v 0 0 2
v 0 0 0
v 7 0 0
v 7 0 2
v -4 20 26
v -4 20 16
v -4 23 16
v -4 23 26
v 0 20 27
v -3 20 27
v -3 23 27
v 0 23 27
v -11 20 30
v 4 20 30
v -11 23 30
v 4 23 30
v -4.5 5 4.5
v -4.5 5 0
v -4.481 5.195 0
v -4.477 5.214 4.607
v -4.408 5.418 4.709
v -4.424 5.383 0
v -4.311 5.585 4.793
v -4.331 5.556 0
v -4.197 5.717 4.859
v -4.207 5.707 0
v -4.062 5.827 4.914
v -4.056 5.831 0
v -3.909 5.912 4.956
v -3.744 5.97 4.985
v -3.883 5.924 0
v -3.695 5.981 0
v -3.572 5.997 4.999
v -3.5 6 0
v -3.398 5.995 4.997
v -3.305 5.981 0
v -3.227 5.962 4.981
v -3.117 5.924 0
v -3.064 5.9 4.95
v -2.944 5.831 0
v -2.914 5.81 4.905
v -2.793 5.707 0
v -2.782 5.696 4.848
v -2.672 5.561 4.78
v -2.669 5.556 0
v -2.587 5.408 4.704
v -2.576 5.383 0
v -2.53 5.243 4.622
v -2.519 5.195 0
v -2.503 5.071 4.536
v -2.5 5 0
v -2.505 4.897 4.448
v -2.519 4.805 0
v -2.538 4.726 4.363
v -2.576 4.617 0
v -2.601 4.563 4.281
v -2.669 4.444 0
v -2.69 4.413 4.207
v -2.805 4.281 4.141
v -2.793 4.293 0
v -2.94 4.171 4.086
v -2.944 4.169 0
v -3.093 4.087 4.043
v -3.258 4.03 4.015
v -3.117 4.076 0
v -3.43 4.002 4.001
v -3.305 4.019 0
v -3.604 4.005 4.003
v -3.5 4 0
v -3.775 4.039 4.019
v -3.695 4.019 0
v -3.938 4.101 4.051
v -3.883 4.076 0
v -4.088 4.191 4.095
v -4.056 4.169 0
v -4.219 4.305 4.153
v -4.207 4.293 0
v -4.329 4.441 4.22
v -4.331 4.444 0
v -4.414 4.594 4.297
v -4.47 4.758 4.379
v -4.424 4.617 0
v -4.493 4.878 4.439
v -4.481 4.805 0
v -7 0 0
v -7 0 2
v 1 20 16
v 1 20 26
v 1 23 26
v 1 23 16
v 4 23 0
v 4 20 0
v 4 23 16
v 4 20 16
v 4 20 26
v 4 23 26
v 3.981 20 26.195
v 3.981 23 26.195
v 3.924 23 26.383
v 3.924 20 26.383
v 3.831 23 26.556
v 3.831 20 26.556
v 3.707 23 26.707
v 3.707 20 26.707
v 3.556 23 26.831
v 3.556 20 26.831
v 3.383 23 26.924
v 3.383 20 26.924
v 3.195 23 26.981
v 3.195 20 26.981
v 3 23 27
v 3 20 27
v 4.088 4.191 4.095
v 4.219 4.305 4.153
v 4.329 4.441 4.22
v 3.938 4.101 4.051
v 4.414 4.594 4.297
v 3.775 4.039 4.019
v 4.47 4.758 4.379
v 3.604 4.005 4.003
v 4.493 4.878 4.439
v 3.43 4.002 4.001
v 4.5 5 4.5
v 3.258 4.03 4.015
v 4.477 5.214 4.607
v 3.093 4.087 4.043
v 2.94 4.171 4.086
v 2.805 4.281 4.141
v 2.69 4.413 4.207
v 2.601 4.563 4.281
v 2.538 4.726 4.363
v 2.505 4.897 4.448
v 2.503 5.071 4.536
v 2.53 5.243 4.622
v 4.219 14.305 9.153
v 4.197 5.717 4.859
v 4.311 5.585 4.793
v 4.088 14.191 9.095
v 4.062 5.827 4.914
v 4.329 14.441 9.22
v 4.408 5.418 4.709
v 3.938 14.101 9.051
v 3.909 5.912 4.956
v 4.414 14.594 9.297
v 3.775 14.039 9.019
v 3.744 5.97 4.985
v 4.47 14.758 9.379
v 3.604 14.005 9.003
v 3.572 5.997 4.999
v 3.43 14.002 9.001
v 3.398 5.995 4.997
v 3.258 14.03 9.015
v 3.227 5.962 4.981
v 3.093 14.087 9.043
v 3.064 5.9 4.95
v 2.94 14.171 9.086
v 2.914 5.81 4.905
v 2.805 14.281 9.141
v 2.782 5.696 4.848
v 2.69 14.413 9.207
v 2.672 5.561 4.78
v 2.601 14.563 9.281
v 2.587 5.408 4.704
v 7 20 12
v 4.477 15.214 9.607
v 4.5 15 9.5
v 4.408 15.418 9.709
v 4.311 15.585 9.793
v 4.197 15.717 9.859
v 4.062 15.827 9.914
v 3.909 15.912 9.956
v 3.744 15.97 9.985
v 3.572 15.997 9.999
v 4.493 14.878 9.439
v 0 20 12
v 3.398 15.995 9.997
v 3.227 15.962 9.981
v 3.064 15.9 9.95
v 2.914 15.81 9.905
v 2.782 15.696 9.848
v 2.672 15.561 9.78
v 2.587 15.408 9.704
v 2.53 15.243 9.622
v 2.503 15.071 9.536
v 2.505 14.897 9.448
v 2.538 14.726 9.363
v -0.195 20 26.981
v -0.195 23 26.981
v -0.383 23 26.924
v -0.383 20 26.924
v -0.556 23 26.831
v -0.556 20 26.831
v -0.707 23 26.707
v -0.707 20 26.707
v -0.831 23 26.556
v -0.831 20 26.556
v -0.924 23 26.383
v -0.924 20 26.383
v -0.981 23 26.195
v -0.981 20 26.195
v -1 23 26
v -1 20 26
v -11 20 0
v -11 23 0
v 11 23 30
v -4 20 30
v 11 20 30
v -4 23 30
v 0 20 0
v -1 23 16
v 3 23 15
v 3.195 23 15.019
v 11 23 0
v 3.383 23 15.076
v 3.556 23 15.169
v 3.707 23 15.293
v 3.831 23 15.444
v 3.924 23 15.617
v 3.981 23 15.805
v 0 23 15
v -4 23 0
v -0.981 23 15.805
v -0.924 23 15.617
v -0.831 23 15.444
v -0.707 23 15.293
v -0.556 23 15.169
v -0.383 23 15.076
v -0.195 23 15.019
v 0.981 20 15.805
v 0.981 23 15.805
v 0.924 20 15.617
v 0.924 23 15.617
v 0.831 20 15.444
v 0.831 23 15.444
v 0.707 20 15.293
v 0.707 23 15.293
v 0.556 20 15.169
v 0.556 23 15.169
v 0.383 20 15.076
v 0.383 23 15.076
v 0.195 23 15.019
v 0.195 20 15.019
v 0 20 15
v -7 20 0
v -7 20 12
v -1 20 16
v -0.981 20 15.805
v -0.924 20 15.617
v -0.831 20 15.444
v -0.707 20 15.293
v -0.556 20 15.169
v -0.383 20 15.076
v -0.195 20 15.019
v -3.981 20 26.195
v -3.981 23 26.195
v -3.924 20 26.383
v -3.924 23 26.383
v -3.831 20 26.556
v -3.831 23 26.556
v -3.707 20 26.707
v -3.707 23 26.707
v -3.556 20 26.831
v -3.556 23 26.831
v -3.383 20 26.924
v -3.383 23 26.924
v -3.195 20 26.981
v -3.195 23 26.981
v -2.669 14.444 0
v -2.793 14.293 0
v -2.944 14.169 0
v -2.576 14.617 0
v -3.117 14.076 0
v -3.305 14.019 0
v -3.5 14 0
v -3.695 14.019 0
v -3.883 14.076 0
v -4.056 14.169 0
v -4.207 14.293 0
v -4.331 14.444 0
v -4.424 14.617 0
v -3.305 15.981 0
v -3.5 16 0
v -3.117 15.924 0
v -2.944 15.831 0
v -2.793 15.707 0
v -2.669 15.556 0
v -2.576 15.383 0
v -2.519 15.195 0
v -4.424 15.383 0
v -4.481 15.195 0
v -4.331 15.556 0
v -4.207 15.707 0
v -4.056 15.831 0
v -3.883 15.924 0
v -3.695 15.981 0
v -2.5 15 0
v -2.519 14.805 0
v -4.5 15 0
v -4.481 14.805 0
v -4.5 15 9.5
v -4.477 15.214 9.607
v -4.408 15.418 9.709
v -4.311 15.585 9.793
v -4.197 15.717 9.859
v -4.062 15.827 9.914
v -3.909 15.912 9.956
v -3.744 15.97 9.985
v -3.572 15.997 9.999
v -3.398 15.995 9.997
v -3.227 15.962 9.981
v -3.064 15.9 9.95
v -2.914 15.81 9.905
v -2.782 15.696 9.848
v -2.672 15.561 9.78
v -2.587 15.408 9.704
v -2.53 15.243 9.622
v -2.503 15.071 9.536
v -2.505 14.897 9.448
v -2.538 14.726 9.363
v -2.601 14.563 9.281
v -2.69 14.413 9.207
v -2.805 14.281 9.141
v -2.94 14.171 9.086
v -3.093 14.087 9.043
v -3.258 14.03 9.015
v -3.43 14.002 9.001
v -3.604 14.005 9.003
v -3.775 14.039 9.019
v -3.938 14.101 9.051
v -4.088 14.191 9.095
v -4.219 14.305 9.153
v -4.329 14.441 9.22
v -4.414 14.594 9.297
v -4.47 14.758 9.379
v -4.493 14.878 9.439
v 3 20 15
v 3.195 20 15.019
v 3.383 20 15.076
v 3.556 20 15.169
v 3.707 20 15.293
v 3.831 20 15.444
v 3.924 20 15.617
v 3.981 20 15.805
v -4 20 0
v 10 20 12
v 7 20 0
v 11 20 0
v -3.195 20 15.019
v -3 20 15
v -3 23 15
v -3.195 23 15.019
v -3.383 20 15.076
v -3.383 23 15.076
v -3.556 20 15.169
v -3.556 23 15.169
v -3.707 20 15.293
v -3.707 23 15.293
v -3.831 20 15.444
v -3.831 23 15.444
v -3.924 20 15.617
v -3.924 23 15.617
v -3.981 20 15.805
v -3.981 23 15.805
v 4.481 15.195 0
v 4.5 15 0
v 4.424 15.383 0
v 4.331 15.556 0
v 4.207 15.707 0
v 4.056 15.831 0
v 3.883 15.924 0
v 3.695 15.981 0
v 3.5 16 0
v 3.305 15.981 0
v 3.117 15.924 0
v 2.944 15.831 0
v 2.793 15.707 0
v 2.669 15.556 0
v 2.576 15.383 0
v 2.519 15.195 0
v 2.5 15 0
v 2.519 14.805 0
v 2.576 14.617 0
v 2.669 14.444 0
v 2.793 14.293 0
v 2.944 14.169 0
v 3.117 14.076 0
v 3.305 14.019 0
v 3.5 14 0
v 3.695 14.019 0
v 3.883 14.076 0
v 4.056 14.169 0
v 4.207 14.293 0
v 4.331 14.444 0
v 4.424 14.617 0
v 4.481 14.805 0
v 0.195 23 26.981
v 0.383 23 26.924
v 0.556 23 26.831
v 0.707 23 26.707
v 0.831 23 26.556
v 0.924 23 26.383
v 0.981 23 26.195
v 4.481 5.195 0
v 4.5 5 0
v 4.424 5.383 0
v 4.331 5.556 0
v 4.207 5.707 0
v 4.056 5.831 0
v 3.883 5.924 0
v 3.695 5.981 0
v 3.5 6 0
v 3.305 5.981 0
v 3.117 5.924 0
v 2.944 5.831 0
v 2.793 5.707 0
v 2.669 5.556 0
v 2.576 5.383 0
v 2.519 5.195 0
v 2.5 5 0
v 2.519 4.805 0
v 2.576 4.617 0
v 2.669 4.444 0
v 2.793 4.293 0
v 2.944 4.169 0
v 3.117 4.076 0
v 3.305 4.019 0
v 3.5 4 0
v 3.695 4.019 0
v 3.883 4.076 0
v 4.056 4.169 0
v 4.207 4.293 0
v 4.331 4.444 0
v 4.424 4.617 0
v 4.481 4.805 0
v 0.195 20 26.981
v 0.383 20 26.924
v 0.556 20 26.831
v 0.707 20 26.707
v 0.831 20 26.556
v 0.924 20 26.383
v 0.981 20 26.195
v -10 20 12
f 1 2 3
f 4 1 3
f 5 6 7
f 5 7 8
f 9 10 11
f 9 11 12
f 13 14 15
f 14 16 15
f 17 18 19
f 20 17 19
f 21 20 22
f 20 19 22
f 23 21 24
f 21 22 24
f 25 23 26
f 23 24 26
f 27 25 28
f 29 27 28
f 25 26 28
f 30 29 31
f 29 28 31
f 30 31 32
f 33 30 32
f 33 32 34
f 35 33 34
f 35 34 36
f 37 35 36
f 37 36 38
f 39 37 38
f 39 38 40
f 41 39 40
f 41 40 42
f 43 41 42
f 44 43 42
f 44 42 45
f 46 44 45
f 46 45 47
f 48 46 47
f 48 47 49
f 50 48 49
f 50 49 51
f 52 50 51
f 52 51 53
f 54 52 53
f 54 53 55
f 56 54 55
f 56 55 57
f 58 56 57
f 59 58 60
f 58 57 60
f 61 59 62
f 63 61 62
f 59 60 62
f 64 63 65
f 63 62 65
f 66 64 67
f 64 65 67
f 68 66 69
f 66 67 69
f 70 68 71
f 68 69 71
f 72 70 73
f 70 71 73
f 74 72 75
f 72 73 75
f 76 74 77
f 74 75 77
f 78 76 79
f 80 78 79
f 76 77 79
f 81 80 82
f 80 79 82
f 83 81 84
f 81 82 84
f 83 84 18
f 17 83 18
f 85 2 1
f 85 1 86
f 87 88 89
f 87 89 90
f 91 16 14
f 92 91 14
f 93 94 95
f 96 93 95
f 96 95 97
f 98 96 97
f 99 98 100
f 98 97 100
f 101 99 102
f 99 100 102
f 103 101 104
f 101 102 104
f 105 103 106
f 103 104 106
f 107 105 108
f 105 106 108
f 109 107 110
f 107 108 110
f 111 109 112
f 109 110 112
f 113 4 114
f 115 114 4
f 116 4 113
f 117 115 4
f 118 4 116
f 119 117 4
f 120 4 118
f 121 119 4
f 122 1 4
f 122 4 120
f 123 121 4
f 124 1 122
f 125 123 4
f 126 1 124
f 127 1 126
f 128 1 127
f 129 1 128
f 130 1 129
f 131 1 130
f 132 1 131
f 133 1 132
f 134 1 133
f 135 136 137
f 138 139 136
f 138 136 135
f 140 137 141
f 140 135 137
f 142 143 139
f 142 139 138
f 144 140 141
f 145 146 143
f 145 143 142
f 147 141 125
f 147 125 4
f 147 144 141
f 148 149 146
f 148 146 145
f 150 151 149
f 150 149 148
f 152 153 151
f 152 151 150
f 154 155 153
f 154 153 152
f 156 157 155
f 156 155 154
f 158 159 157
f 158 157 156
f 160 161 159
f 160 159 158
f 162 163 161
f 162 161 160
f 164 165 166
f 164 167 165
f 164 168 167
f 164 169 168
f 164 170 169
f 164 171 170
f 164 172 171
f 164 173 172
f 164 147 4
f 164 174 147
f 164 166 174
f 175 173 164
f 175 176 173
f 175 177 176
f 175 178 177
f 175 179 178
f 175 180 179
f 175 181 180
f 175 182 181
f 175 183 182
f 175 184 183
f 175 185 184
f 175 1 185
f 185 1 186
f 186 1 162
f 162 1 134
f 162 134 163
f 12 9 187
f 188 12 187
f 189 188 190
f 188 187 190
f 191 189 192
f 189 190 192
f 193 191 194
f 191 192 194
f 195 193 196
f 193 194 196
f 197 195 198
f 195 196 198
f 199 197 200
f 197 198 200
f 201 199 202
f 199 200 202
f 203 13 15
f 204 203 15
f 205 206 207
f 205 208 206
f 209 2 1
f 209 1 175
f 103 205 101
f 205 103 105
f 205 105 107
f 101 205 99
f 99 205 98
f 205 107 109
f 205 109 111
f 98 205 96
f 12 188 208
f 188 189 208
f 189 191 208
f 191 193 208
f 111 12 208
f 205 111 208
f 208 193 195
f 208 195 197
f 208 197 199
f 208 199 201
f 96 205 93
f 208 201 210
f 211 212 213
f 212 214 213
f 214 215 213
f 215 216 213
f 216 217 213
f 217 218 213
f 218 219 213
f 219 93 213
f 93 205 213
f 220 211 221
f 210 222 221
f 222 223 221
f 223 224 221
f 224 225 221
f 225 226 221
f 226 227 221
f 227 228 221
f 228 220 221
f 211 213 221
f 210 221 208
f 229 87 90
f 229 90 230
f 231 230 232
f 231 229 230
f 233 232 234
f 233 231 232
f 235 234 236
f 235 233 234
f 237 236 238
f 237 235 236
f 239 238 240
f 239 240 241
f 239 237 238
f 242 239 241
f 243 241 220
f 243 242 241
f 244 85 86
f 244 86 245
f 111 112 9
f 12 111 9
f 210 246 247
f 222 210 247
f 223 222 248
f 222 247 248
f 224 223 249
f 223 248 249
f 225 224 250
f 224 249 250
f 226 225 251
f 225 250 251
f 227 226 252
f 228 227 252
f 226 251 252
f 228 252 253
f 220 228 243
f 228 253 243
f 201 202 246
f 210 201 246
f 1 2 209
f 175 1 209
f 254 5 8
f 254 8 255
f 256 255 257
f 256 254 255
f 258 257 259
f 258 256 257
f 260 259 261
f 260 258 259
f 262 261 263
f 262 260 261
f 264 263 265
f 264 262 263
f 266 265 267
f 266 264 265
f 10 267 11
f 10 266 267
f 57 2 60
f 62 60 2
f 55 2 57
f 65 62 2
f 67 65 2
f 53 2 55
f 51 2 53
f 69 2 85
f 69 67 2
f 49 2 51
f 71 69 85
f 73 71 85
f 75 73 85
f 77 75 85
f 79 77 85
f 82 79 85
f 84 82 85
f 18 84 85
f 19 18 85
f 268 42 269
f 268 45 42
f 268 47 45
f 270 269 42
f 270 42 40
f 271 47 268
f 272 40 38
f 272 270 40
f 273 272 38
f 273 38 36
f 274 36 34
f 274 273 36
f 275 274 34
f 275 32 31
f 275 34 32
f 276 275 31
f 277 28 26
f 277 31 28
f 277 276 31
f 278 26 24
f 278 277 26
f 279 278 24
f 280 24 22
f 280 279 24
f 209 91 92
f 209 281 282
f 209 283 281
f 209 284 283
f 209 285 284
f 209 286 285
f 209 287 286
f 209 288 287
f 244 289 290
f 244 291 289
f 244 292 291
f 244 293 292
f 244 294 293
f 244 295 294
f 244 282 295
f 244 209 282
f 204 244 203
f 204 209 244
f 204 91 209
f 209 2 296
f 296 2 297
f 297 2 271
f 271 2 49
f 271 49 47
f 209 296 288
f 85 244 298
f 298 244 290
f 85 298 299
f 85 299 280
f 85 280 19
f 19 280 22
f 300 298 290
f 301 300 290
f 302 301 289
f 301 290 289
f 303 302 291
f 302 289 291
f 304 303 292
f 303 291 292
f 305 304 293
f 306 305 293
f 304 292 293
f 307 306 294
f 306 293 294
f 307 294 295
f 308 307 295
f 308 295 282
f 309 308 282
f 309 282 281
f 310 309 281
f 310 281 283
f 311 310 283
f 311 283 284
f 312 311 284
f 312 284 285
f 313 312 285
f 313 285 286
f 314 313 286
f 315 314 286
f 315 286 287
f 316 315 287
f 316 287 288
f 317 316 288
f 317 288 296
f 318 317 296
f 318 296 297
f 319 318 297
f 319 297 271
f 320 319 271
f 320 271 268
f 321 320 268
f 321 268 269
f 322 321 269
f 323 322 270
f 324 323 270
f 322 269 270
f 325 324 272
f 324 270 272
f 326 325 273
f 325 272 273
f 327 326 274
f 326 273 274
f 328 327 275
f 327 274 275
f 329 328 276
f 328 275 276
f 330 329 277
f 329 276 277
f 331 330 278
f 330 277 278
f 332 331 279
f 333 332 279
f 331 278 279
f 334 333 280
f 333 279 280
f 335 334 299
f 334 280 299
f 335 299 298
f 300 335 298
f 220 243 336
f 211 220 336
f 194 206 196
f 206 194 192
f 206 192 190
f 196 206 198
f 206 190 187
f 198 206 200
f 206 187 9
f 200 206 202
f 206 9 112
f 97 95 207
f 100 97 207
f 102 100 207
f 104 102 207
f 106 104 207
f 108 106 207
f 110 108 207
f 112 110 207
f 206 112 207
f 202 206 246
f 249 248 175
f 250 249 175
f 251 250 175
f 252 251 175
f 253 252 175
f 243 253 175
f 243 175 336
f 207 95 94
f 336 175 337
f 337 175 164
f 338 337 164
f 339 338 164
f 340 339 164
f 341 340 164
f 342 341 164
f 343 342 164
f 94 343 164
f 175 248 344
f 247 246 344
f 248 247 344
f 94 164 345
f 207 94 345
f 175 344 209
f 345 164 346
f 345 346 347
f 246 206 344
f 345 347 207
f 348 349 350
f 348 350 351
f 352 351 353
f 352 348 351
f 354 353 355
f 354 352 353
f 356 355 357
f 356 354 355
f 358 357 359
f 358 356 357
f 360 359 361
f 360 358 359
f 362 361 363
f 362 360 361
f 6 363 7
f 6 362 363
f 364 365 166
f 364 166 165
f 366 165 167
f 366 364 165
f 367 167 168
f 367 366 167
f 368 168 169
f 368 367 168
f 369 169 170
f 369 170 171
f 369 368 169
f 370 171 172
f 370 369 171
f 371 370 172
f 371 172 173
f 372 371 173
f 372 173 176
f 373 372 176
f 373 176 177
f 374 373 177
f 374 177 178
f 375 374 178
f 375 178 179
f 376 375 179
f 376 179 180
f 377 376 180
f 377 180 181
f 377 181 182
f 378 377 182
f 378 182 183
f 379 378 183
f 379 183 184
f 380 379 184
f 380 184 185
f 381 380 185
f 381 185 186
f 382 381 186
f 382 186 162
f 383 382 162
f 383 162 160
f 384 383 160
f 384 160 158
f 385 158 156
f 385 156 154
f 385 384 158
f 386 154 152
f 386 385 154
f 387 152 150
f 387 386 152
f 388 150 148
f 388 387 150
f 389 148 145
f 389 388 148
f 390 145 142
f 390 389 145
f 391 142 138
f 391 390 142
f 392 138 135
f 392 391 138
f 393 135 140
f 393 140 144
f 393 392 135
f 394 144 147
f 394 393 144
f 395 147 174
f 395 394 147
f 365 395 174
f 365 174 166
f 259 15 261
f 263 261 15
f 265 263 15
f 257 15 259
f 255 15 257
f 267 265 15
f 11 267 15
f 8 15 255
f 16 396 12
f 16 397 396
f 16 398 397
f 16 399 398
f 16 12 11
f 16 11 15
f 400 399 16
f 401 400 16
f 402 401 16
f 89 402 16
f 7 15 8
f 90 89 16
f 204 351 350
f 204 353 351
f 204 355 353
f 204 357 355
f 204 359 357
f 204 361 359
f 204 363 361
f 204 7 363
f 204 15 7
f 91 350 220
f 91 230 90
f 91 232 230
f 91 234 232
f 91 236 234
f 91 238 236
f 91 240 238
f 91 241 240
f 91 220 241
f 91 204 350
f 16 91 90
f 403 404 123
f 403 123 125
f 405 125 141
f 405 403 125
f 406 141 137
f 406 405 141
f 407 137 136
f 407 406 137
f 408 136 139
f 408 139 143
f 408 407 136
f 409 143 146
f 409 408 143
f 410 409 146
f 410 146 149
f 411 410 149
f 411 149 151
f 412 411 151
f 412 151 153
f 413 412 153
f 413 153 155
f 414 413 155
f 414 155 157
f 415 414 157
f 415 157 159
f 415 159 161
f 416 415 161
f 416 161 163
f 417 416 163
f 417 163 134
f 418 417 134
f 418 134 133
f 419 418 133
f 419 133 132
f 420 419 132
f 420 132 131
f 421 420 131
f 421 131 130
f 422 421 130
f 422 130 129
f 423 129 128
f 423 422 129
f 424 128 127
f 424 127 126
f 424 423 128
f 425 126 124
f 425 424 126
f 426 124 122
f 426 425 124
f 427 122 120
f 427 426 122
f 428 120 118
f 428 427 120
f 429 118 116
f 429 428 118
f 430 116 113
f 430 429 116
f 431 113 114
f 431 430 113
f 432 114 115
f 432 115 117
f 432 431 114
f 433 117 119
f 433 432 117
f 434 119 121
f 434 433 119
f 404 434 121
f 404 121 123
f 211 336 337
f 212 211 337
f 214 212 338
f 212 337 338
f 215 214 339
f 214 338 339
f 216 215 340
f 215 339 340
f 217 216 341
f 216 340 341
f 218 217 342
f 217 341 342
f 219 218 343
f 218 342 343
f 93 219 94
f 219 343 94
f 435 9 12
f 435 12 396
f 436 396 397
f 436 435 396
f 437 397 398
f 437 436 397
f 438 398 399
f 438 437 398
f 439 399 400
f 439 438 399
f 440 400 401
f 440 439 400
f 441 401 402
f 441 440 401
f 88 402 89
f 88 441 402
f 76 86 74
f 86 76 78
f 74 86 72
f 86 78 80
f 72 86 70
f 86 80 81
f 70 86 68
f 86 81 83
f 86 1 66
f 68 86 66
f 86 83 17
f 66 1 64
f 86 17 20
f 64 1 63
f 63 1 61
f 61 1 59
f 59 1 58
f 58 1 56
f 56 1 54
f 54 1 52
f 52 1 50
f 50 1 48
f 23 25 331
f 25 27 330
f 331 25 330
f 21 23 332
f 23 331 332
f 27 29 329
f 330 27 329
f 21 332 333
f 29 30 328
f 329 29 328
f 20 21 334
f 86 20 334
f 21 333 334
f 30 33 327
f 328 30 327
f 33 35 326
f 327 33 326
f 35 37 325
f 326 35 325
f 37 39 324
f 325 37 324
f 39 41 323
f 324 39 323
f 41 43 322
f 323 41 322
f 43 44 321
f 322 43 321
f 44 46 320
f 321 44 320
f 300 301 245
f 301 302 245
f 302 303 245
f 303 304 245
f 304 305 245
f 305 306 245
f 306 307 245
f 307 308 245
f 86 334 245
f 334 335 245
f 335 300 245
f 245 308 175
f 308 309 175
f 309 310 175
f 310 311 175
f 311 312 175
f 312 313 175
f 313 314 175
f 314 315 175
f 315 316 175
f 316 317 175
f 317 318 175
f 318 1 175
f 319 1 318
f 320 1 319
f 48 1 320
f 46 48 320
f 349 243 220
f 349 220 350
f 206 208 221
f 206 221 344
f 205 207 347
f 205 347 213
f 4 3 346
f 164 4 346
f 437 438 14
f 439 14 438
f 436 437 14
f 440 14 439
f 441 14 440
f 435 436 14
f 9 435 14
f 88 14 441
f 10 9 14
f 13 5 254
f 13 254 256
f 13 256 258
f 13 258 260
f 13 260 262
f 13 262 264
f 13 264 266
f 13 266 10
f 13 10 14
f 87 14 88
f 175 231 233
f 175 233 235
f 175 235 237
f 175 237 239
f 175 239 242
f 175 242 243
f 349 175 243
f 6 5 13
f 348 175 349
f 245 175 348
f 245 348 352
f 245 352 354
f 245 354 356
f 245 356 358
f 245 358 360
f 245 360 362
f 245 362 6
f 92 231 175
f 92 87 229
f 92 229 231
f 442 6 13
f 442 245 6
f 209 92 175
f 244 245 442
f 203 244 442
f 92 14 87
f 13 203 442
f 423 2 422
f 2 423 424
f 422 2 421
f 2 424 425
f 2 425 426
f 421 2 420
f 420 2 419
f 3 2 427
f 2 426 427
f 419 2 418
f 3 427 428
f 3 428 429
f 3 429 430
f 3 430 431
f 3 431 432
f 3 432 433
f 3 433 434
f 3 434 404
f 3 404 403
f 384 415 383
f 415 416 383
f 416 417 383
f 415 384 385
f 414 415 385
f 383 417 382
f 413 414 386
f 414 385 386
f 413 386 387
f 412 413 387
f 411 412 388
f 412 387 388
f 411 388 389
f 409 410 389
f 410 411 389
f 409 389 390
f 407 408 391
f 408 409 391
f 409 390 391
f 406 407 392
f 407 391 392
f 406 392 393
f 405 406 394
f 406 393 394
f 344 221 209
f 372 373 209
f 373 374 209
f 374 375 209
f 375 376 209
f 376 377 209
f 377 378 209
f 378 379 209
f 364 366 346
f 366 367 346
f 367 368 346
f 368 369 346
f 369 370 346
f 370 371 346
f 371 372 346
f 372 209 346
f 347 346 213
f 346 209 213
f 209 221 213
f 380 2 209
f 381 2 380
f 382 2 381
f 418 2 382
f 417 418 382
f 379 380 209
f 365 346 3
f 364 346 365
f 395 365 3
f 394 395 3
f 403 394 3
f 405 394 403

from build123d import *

# Parameters (mm, degrees)
F0_W     = 7
F0_H     = 20
F0_R     = 1
F1_DEPTH = 12
F3_DEPTH = 30
F5_DEPTH = 10
F7_DEPTH = 25.4


with BuildPart() as f1:
    # F0 (on Top) → F1 (new body)
    with BuildSketch(Plane.XY):
        with Locations((3.5, 10)):
            Rectangle(F0_W, F0_H)
        with Locations((3.5, 5)):
            Circle(F0_R, mode=Mode.SUBTRACT)
        with Locations((3.5, 15)):
            Circle(F0_R, mode=Mode.SUBTRACT)
    extrude(amount=F1_DEPTH)

    # F2 (on Top) → F3 (join)
    with BuildSketch(Plane.XY):
        Polygon((-4, 20), (7, 20), (11, 20), (11, 23), (7, 23), (-4, 23), align=None)
    extrude(amount=F3_DEPTH)

    # F4 (on Right) → F5 (cut)
    with BuildSketch(Plane.YZ):
        Polygon((0, 2), (20, 12), (0, 12), align=None)
    extrude(amount=F5_DEPTH, mode=Mode.SUBTRACT)

    # F6 (on Front) → F7 (cut)
    with BuildSketch(Plane.XZ):
        with BuildLine():
            Line((0, 15), (3, 15))
            ThreePointArc((3, 15), (3.707107, 15.292893), (4, 16))
            Line((4, 16), (4, 26))
            ThreePointArc((4, 26), (3.707107, 26.707107), (3, 27))
            Line((3, 27), (0, 27))
            ThreePointArc((0, 27), (-0.707107, 26.707107), (-1, 26))
            Line((-1, 26), (-1, 16))
            ThreePointArc((-1, 16), (-0.707107, 15.292893), (0, 15))
        make_face()
    extrude(amount=-F7_DEPTH, mode=Mode.SUBTRACT)


with BuildPart() as f8_1:
    # F8: instance of F1
    add(f1.part.mirror(Plane.YZ))


solid = Compound([f1.part, f8_1.part])
